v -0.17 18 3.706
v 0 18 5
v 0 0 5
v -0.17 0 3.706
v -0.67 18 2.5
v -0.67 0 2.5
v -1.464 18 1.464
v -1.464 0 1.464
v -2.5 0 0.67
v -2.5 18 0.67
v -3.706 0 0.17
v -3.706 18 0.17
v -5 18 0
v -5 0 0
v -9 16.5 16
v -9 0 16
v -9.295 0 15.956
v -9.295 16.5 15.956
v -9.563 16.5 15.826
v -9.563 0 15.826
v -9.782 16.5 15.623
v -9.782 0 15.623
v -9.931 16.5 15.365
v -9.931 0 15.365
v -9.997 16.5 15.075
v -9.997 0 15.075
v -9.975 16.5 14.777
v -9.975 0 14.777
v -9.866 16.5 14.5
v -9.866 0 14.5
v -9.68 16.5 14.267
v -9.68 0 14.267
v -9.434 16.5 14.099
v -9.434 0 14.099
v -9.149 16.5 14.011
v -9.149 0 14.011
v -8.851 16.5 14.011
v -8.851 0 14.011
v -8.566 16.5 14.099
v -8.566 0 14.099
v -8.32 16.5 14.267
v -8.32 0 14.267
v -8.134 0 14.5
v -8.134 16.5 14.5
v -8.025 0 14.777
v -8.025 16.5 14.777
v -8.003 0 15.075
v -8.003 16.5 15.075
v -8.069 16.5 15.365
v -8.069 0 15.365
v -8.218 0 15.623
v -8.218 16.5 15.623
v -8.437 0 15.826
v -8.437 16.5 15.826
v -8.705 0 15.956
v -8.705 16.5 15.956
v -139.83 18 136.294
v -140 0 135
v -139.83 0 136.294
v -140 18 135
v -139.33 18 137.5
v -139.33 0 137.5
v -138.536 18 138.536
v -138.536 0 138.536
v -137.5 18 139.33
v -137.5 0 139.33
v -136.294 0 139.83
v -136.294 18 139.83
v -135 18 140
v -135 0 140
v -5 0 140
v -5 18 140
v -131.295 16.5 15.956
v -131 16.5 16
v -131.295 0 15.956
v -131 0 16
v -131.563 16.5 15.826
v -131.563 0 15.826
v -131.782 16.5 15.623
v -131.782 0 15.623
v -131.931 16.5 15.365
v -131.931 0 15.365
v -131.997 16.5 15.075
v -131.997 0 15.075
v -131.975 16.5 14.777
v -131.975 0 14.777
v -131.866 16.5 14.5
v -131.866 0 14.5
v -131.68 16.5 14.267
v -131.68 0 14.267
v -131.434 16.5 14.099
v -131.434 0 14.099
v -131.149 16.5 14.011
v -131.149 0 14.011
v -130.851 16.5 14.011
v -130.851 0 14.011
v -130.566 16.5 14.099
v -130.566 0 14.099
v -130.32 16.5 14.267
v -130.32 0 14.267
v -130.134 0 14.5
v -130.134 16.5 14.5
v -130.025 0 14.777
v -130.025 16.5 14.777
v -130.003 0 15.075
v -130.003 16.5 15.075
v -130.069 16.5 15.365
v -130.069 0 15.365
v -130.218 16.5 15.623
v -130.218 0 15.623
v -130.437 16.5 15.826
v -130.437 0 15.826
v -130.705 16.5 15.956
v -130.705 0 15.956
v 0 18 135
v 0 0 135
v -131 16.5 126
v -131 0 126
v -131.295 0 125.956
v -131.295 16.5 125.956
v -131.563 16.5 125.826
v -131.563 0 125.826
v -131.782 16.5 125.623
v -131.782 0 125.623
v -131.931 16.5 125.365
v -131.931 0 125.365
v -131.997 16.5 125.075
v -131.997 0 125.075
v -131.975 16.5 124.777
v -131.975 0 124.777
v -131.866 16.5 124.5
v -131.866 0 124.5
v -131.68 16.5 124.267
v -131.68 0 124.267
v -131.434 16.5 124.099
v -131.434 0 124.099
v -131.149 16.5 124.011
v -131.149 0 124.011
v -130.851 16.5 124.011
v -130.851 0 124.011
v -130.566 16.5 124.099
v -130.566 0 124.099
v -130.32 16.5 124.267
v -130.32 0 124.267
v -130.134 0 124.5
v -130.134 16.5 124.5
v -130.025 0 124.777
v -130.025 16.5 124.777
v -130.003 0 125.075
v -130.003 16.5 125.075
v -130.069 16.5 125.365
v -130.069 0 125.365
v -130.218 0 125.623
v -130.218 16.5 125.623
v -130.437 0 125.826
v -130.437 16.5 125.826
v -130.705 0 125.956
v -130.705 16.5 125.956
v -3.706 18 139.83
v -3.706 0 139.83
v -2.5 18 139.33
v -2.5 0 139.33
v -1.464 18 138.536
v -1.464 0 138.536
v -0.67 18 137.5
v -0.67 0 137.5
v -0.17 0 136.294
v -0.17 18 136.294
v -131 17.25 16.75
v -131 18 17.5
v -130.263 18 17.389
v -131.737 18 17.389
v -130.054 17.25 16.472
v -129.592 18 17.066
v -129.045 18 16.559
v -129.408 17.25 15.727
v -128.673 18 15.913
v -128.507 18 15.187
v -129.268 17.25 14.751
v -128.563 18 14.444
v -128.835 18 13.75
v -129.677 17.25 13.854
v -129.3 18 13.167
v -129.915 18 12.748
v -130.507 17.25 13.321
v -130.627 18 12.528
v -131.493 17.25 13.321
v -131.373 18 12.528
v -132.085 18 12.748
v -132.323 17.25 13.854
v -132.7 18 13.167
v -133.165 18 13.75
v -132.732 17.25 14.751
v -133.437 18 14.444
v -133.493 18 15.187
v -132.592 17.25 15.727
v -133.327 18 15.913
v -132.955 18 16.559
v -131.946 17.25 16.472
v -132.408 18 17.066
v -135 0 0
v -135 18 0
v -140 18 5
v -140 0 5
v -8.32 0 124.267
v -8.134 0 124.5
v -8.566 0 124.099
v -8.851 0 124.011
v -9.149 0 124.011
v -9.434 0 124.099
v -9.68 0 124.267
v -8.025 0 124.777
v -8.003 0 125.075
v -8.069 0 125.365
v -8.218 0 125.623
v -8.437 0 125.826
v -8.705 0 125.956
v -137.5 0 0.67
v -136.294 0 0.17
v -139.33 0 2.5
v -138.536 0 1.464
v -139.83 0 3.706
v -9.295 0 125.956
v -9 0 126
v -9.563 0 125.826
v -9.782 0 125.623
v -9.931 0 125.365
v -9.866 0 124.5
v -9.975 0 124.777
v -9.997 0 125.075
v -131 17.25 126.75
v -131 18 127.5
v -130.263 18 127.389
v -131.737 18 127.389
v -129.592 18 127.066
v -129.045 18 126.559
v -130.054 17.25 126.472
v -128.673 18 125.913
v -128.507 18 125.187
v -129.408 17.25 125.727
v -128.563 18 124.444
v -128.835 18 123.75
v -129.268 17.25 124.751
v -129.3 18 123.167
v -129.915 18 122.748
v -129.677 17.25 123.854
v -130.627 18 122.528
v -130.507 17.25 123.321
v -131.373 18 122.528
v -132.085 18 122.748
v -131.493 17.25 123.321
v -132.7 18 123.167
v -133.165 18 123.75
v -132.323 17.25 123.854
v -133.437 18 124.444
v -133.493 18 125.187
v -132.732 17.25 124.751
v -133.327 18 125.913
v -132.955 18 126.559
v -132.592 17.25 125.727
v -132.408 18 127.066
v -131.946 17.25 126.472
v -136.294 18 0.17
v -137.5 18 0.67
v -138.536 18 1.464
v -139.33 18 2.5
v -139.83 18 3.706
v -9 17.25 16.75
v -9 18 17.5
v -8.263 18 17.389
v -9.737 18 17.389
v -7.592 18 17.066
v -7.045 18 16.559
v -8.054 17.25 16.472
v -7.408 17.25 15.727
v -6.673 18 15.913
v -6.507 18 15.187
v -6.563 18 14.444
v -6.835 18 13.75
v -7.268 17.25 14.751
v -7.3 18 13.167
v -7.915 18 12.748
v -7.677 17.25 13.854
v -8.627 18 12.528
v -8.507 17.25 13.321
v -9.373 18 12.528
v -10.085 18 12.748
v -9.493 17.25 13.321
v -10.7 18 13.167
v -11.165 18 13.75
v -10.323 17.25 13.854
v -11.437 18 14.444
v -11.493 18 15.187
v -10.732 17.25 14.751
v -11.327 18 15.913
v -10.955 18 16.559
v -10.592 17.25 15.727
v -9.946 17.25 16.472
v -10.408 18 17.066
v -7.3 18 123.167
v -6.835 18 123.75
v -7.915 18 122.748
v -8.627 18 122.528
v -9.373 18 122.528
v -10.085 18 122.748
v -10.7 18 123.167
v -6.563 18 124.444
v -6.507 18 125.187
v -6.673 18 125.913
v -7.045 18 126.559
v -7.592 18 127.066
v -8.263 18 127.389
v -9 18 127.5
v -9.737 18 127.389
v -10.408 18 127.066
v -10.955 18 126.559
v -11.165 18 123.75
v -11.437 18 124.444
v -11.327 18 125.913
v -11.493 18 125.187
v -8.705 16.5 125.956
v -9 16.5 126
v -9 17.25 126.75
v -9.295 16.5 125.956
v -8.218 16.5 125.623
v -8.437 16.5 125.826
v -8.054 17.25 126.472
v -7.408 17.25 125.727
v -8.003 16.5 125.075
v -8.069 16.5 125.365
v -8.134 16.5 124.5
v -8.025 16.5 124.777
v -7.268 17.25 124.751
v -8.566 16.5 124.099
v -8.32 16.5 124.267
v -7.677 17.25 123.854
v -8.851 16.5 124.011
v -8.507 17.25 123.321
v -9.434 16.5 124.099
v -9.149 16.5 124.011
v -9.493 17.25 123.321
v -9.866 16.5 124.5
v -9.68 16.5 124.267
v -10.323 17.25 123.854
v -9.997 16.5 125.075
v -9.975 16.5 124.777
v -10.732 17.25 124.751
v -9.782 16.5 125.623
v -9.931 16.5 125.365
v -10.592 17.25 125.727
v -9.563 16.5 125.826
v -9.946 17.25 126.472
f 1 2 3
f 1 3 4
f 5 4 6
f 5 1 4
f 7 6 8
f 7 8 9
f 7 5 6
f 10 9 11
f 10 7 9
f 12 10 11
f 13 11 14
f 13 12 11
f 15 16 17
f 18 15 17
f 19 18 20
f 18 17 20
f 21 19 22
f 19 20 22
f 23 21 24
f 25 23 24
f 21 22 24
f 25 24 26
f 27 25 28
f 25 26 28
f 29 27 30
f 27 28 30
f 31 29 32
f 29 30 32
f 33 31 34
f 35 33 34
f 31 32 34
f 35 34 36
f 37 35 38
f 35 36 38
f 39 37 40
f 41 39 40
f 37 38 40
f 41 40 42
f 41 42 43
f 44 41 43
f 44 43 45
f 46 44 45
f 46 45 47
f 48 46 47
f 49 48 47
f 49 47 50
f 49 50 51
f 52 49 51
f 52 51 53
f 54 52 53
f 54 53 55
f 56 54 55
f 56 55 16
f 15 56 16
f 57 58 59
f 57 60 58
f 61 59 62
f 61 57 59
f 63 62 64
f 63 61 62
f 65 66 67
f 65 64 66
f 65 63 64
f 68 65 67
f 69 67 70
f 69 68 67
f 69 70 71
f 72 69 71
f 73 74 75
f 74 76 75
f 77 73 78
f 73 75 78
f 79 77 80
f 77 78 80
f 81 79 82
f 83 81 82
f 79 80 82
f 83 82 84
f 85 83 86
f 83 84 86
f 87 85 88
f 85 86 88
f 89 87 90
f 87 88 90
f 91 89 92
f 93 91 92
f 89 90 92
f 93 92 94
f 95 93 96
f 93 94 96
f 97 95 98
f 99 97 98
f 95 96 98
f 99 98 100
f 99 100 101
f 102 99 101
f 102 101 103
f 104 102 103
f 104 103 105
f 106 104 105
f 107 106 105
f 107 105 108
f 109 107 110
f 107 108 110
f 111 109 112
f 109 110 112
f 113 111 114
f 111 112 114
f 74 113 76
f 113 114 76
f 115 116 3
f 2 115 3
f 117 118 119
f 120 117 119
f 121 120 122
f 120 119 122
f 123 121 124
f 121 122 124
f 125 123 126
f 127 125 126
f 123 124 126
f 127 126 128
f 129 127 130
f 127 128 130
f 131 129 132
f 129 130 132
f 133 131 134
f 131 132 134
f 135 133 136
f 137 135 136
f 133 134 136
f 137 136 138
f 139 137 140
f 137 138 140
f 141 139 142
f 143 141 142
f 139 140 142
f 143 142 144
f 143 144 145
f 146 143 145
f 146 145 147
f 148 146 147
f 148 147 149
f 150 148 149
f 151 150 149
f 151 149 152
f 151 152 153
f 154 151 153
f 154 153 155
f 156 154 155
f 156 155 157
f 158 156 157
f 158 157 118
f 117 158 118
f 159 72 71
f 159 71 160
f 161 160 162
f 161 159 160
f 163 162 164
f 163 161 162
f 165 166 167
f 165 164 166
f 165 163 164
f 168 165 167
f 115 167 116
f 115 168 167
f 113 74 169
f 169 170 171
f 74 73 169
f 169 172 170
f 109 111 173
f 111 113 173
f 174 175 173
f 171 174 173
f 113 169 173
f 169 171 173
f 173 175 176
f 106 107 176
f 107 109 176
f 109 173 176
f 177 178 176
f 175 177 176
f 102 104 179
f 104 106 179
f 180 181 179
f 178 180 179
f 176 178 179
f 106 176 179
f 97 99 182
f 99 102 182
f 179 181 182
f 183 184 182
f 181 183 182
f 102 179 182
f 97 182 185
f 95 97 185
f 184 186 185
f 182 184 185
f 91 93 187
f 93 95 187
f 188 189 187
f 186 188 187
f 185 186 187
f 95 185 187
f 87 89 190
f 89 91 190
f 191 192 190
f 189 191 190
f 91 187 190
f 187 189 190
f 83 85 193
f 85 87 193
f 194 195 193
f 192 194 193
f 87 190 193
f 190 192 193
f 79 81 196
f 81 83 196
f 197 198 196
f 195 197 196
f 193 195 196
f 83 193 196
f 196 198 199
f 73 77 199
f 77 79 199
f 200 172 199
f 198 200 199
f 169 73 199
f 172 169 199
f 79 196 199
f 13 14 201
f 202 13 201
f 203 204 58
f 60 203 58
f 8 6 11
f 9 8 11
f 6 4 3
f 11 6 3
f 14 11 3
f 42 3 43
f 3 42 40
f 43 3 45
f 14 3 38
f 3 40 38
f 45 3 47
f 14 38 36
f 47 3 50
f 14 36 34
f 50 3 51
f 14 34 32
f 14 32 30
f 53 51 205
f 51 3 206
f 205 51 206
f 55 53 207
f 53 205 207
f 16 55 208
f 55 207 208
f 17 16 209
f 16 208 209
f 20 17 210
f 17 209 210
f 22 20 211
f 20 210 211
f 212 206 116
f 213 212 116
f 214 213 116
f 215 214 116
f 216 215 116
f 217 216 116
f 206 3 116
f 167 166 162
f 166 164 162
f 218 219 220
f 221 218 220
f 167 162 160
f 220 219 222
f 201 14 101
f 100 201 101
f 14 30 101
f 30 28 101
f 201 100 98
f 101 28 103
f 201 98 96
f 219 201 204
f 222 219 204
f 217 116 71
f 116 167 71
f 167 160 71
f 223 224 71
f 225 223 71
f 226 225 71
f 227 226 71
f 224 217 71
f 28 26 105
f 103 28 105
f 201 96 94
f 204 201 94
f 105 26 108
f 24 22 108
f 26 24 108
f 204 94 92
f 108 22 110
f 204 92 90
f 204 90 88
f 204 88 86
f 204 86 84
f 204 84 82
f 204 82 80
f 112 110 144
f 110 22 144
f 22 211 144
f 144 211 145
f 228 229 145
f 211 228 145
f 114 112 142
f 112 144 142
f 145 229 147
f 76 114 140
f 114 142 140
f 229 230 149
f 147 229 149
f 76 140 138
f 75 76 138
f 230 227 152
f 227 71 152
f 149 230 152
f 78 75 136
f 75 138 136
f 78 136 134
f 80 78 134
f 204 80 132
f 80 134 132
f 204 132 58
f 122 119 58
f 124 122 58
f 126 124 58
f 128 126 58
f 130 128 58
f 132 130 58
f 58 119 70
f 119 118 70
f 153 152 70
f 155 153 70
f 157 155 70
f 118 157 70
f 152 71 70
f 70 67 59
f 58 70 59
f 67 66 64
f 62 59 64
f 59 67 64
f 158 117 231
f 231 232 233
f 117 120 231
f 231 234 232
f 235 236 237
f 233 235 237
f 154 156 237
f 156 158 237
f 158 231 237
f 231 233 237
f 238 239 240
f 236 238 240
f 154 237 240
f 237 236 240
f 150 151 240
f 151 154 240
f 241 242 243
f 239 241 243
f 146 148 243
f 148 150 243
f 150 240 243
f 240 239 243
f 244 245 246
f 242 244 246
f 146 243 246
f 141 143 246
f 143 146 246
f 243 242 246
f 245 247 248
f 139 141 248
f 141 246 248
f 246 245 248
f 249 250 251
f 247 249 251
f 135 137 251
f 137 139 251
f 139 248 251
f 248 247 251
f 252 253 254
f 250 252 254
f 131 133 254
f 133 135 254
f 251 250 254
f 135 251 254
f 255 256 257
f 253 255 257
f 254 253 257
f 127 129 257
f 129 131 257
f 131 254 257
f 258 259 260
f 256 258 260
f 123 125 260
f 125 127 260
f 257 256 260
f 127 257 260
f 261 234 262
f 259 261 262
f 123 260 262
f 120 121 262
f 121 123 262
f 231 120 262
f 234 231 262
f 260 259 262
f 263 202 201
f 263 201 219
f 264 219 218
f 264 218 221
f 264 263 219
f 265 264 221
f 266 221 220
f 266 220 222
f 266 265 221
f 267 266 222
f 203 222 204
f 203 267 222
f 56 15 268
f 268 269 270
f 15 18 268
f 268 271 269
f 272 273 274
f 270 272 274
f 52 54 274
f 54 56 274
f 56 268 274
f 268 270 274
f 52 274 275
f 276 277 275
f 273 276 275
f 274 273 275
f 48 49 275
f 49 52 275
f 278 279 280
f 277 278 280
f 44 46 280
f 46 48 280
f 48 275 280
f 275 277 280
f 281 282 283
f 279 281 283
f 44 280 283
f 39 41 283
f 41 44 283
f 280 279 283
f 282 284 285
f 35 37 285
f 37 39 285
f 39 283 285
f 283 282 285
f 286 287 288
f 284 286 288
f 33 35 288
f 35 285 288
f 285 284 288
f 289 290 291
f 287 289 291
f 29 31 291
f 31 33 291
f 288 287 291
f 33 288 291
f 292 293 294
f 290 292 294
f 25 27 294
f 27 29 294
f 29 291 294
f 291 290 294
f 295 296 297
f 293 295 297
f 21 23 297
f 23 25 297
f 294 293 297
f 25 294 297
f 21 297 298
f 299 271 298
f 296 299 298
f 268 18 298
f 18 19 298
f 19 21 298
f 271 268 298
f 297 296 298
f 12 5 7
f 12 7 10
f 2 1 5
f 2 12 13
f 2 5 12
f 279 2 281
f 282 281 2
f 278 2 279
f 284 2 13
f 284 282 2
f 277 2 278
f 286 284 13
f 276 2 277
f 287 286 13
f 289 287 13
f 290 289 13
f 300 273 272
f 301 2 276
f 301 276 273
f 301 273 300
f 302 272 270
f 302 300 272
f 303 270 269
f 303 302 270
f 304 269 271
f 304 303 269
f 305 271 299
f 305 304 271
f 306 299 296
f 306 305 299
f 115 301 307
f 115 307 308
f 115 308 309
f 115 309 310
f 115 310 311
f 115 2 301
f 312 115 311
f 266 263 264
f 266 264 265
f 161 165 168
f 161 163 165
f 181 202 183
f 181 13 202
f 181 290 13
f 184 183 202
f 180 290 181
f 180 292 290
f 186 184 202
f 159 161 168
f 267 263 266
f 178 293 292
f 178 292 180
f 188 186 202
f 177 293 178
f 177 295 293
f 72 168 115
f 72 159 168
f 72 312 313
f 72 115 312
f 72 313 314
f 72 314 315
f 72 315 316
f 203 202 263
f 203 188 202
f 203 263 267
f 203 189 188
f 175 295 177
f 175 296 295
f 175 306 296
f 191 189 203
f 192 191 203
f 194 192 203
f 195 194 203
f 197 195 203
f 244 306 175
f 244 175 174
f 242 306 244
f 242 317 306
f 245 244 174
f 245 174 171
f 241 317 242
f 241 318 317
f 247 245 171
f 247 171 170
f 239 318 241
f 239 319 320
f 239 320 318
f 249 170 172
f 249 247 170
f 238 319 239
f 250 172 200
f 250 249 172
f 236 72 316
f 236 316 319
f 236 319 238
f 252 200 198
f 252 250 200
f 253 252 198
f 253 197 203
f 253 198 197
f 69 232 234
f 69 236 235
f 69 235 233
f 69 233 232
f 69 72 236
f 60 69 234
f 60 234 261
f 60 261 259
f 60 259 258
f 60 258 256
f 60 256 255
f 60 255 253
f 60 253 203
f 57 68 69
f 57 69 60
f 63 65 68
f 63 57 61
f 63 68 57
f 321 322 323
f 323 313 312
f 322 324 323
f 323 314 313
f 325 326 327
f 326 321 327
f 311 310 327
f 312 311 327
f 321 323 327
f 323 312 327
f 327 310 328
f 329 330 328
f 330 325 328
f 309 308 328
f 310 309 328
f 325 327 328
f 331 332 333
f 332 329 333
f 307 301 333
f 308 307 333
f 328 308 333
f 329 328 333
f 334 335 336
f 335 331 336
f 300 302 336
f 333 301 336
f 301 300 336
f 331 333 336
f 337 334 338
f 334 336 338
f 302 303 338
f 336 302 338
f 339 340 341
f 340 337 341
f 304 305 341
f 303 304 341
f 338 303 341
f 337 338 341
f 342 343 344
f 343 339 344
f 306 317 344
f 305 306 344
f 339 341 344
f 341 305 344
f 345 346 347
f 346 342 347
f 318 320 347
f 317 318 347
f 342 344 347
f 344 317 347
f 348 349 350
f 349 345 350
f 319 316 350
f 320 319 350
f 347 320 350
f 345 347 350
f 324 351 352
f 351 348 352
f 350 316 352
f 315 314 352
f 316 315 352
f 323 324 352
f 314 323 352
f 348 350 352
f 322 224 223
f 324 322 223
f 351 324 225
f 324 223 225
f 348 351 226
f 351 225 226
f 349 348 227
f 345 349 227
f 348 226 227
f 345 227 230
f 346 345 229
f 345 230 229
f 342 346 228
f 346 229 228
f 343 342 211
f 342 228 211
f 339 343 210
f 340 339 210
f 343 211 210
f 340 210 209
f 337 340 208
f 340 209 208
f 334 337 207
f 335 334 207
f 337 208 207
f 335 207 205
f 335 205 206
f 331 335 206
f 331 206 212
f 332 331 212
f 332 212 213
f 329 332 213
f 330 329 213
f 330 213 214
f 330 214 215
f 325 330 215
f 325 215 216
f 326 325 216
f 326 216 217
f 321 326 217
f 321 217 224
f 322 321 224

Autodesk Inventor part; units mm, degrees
ref_plane "YZ Plane" through (0, 0, 0) normal (1, 0, 0) x (0, 1, 0)
ref_plane "XZ Plane" through (0, 0, 0) normal (0, 1, 0) x (-1, 0, 0)
ref_plane "XY Plane" through (0, 0, 0) normal (0, 0, 1) x (1, 0, 0)
sketch "Skizze1" plane through (0, 0, 0) normal (0, 1, 0) x (-1, 0, 0)
  line L0 (0, 0) -> (140, 0)
  line L1 (140, 0) -> (140, 140)
  line L2 (140, 140) -> (0, 140)
  line L3 (0, 140) -> (0, 0)
  dimension "d0" = 140
  dimension "d1" = 140
extrude "Extrusion1" add sketch "Skizze1" along normal blind 18
sketch "Skizze2" plane through (0, 18, 0) normal (0, 1, 0) x (1, 0, 0)
  line L0 (0, 0) -> (-140, 0) projected
  line L1 (-140, 0) -> (-140, -140) projected
  line L2 (-140, -140) -> (0, -140) projected
  line L3 (0, -140) -> (0, 0) projected
  point P0 (-131, -15)
  point P1 (-131, -125)
  point P2 (-9, -15)
  point P3 (-9, -125)
  dimension "d4" = 15
  dimension "d5" = 15
  dimension "d6" = 15
  dimension "d7" = 15
  dimension "d8" = 9
  dimension "d9" = 9
  dimension "d10" = 9
  dimension "d11" = 9
hole "Bohrung1" at (-131, 18, 15) at (-131, 18, 125) at (-9, 18, 15) at (-9, 18, 125) direction (0, -1, 0) diameter 2 end through all countersink diameter 5 countersink angle 90
fillet "Rundung1" radius 5 4 edges at (-140, 9, 0) (-140, 9, 140) (0, 9, 140) (0, 9, 0)
sketch "Skizze3" plane through (0, 0, 0) normal (0, -1, 0) x (1, 0, 0)
  point P0 (-15, 9)
properties part number "Boden" material "Eiche, weiß"
